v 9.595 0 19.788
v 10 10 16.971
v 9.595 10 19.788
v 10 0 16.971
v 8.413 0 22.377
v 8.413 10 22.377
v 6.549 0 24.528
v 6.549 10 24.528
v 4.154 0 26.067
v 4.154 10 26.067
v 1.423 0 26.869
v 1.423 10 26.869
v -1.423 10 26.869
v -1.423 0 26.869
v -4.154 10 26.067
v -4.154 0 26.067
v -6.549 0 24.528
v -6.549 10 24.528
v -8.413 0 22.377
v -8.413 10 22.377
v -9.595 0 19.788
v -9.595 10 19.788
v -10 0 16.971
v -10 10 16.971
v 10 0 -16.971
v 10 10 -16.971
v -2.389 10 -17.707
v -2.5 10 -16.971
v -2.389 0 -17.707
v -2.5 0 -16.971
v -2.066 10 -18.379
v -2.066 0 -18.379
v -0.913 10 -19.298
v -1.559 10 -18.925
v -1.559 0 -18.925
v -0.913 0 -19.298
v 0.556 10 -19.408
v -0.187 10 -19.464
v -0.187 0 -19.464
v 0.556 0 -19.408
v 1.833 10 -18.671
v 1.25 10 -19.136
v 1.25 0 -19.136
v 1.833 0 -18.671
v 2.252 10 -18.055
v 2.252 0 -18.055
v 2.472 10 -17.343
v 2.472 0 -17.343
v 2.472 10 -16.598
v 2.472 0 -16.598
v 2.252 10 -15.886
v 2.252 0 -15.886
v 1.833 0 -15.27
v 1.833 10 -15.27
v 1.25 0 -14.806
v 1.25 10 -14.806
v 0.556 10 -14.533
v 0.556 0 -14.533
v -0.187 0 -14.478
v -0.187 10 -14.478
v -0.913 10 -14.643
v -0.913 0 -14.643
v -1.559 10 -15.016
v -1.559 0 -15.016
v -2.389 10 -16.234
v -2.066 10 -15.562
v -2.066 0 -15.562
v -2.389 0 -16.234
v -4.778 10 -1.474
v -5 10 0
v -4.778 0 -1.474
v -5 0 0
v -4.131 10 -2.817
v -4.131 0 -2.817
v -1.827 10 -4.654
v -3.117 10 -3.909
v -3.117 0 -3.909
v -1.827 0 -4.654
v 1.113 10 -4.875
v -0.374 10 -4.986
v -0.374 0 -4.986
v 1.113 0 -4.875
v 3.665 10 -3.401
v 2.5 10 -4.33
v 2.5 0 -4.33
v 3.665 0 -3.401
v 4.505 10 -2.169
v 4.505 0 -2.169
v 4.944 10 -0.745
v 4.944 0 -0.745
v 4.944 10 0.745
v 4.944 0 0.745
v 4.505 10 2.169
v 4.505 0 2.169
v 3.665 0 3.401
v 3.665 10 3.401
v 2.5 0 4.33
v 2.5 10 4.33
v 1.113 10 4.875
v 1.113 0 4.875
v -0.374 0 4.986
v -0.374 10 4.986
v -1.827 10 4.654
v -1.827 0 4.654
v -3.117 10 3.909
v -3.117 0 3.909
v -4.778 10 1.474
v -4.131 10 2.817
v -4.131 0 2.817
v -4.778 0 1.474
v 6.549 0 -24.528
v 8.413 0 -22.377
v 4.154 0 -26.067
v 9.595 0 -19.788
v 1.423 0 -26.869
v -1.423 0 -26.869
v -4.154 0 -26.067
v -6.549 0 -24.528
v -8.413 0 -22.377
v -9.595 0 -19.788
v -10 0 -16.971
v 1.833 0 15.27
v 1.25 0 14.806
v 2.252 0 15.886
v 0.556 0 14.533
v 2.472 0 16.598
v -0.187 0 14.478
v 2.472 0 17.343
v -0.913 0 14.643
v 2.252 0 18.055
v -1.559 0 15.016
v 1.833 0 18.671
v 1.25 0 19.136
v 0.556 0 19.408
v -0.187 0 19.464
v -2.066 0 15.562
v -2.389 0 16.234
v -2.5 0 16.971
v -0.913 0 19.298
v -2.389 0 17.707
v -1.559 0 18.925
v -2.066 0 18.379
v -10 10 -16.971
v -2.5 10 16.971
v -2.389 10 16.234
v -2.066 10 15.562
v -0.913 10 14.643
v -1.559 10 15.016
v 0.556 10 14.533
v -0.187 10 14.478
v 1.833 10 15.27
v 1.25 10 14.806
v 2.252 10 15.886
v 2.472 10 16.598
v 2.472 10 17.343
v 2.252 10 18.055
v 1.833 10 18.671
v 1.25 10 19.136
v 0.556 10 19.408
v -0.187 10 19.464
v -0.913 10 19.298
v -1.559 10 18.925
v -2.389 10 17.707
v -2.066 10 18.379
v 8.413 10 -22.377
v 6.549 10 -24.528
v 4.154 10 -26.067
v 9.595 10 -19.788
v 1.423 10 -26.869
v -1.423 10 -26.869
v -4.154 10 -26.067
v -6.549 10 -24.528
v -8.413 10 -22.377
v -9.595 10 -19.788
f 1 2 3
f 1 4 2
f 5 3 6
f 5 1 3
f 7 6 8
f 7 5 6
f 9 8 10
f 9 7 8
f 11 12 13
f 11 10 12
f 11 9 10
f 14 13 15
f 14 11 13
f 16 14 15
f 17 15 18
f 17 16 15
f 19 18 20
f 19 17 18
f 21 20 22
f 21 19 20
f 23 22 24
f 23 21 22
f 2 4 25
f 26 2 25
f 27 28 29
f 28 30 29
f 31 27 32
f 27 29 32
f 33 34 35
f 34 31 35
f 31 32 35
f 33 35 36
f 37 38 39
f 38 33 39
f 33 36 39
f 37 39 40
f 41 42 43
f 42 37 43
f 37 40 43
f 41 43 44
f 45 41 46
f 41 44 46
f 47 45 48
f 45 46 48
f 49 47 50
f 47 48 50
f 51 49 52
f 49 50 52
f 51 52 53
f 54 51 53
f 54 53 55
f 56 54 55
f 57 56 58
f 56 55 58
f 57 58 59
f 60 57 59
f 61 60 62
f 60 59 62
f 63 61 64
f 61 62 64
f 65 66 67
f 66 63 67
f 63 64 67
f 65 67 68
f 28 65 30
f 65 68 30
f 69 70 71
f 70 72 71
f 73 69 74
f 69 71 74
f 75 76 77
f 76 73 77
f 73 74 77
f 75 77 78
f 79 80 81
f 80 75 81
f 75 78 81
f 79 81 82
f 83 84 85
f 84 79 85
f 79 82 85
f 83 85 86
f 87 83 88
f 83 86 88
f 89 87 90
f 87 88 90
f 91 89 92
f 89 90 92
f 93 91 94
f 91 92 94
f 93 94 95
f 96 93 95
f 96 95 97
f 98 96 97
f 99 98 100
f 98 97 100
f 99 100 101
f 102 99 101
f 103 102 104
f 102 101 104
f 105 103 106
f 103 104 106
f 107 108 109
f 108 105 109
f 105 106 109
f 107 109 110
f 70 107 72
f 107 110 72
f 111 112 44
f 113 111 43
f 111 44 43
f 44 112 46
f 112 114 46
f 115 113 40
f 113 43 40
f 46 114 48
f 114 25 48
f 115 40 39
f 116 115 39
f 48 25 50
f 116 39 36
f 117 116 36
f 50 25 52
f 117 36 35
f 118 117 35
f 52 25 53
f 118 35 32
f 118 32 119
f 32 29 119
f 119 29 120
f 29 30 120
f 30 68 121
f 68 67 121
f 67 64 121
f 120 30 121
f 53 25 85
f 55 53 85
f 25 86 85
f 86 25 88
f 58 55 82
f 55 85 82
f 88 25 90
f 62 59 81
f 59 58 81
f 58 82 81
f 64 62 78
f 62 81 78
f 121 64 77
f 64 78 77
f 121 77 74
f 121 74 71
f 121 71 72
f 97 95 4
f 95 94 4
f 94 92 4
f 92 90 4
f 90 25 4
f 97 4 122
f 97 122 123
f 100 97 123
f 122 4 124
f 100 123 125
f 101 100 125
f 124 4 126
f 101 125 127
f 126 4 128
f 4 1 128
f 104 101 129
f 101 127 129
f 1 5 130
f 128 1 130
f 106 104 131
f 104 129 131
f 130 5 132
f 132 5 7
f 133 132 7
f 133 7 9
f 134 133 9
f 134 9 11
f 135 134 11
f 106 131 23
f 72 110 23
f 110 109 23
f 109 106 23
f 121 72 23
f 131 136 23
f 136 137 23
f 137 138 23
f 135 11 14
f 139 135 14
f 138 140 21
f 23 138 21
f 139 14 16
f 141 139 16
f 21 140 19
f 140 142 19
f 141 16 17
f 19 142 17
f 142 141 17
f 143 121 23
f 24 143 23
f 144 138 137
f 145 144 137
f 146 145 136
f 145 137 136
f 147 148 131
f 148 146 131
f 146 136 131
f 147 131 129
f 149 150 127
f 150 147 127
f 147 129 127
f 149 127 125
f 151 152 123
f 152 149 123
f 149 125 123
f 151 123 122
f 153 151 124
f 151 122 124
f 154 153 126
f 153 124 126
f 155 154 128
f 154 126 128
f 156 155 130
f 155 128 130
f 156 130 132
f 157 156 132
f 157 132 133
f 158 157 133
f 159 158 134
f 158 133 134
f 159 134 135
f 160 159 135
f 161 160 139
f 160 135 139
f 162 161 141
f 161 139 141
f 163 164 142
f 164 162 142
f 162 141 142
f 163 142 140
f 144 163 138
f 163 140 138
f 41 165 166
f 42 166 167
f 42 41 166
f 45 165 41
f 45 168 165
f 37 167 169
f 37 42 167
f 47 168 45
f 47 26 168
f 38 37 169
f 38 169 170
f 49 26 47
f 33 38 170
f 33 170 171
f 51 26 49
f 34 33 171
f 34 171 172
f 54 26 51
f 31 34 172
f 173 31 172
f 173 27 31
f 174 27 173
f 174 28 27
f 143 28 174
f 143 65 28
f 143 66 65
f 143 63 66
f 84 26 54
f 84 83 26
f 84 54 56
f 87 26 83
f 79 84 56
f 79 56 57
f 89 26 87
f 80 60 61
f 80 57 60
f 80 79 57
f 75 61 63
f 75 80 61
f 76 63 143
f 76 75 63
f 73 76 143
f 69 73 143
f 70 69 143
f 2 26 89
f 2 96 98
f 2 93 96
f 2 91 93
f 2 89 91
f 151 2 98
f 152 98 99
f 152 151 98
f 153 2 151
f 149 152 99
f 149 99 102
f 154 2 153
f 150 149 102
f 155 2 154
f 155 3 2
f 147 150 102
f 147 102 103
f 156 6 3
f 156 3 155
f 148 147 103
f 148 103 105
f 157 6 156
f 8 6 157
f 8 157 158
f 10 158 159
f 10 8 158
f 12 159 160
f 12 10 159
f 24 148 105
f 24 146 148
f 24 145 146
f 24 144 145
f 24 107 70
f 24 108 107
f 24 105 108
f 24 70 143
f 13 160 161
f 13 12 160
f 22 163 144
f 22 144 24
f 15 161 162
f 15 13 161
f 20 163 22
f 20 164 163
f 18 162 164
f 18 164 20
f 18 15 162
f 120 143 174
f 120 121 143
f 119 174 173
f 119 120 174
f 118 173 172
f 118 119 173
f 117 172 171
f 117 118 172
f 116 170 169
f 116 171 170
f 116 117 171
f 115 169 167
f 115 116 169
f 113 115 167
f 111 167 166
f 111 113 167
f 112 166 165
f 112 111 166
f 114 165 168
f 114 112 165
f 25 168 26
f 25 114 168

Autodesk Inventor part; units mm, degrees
ref_plane "YZ Plane" through (0, 0, 0) normal (1, 0, 0) x (0, 1, 0)
ref_plane "XZ Plane" through (0, 0, 0) normal (0, 1, 0) x (-1, 0, 0)
ref_plane "XY Plane" through (0, 0, 0) normal (0, 0, 1) x (1, 0, 0)
sketch "Block1" plane through (0, 0, 0) normal (0, 0, 1) x (1, 0, 0)
  circle A0 centre (0, 0) radius 20.22
  circle A1 centre (0, 12) radius 2.72
  circle A2 centre (0, 0) radius 5.22
  circle A3 centre (0, -12) radius 2.72
sketch "Block2" plane through (0, 0, 0) normal (0, 0, 1) x (1, 0, 0)
  circle A0 centre (0, 0) radius 22.72
  circle A1 centre (-12, 12) radius 2.72
  circle A2 centre (0, 0) radius 5.22
  point P0 (-4, 4)
sketch "Block3" plane through (0, 0, 0) normal (0, 0, 1) x (1, 0, 0)
  line L0 (-10.22, -16.9706) -> (-10.22, 16.9706)
  arc A0 (10.22, 16.9706) -> (-10.22, 16.9706) centre (0, 16.9706) ccw
  line L1 (10.22, 16.9706) -> (10.22, -16.9706)
  arc A1 (-10.22, -16.9706) -> (10.22, -16.9706) centre (0, -16.9706) ccw
  circle A2 centre (0, -16.9706) radius 2.72
  circle A3 centre (0, 0) radius 5.22
  circle A4 centre (0, 16.9706) radius 2.72
  point P0 (0, 0)
sketch "Sketch9" plane through (0, 0, 0) normal (0, 1, 0) x (-1, 0, 0)
  line L0 (0, -16.9706) -> (0, 16.9706) construction
  line L1 (10, -16.9706) -> (10, 16.9706)
  line L2 (-10, 16.9706) -> (-10, -16.9706)
  arc A0 (-10, -16.9706) -> (10, -16.9706) centre (0, -16.9706) ccw
  arc A1 (10, 16.9706) -> (-10, 16.9706) centre (0, 16.9706) ccw
  circle A2 centre (0, 0) radius 5
  circle A3 centre (0, 16.9706) radius 2.5
  circle A4 centre (0, -16.9706) radius 2.5
  dimension "d33" = 10
  dimension "d34" = 33.9411
  dimension "d35" = 10
  dimension "d36" = 5
  dimension "d37" = 5
extrude "Extrusion6" add sketch "Sketch9" along normal blind 10
sketch "Sketch10" plane through (0, 10, 0) normal (0, 1, 0) x (1, 0, 0)
  circle A0 centre (0, 0) radius 5 projected
  circle A1 centre (0, 16.9706) radius 2.5 projected
  circle A2 centre (0, -16.9706) radius 2.5 projected
  line L0 (-10, 16.9706) -> (-10, -16.9706) projected
  arc A3 (-10, -16.9706) -> (10, -16.9706) centre (0, -16.9706) ccw projected
  line L1 (10, -16.9706) -> (10, 16.9706) projected
  arc A4 (10, 16.9706) -> (-10, 16.9706) centre (0, 16.9706) ccw projected
sketch "DXF" plane through (0, 0, 0) normal (0, 1, 0) x (-1, 0, 0)
  point P0 (0, 0)
properties part number "gearSupport"
